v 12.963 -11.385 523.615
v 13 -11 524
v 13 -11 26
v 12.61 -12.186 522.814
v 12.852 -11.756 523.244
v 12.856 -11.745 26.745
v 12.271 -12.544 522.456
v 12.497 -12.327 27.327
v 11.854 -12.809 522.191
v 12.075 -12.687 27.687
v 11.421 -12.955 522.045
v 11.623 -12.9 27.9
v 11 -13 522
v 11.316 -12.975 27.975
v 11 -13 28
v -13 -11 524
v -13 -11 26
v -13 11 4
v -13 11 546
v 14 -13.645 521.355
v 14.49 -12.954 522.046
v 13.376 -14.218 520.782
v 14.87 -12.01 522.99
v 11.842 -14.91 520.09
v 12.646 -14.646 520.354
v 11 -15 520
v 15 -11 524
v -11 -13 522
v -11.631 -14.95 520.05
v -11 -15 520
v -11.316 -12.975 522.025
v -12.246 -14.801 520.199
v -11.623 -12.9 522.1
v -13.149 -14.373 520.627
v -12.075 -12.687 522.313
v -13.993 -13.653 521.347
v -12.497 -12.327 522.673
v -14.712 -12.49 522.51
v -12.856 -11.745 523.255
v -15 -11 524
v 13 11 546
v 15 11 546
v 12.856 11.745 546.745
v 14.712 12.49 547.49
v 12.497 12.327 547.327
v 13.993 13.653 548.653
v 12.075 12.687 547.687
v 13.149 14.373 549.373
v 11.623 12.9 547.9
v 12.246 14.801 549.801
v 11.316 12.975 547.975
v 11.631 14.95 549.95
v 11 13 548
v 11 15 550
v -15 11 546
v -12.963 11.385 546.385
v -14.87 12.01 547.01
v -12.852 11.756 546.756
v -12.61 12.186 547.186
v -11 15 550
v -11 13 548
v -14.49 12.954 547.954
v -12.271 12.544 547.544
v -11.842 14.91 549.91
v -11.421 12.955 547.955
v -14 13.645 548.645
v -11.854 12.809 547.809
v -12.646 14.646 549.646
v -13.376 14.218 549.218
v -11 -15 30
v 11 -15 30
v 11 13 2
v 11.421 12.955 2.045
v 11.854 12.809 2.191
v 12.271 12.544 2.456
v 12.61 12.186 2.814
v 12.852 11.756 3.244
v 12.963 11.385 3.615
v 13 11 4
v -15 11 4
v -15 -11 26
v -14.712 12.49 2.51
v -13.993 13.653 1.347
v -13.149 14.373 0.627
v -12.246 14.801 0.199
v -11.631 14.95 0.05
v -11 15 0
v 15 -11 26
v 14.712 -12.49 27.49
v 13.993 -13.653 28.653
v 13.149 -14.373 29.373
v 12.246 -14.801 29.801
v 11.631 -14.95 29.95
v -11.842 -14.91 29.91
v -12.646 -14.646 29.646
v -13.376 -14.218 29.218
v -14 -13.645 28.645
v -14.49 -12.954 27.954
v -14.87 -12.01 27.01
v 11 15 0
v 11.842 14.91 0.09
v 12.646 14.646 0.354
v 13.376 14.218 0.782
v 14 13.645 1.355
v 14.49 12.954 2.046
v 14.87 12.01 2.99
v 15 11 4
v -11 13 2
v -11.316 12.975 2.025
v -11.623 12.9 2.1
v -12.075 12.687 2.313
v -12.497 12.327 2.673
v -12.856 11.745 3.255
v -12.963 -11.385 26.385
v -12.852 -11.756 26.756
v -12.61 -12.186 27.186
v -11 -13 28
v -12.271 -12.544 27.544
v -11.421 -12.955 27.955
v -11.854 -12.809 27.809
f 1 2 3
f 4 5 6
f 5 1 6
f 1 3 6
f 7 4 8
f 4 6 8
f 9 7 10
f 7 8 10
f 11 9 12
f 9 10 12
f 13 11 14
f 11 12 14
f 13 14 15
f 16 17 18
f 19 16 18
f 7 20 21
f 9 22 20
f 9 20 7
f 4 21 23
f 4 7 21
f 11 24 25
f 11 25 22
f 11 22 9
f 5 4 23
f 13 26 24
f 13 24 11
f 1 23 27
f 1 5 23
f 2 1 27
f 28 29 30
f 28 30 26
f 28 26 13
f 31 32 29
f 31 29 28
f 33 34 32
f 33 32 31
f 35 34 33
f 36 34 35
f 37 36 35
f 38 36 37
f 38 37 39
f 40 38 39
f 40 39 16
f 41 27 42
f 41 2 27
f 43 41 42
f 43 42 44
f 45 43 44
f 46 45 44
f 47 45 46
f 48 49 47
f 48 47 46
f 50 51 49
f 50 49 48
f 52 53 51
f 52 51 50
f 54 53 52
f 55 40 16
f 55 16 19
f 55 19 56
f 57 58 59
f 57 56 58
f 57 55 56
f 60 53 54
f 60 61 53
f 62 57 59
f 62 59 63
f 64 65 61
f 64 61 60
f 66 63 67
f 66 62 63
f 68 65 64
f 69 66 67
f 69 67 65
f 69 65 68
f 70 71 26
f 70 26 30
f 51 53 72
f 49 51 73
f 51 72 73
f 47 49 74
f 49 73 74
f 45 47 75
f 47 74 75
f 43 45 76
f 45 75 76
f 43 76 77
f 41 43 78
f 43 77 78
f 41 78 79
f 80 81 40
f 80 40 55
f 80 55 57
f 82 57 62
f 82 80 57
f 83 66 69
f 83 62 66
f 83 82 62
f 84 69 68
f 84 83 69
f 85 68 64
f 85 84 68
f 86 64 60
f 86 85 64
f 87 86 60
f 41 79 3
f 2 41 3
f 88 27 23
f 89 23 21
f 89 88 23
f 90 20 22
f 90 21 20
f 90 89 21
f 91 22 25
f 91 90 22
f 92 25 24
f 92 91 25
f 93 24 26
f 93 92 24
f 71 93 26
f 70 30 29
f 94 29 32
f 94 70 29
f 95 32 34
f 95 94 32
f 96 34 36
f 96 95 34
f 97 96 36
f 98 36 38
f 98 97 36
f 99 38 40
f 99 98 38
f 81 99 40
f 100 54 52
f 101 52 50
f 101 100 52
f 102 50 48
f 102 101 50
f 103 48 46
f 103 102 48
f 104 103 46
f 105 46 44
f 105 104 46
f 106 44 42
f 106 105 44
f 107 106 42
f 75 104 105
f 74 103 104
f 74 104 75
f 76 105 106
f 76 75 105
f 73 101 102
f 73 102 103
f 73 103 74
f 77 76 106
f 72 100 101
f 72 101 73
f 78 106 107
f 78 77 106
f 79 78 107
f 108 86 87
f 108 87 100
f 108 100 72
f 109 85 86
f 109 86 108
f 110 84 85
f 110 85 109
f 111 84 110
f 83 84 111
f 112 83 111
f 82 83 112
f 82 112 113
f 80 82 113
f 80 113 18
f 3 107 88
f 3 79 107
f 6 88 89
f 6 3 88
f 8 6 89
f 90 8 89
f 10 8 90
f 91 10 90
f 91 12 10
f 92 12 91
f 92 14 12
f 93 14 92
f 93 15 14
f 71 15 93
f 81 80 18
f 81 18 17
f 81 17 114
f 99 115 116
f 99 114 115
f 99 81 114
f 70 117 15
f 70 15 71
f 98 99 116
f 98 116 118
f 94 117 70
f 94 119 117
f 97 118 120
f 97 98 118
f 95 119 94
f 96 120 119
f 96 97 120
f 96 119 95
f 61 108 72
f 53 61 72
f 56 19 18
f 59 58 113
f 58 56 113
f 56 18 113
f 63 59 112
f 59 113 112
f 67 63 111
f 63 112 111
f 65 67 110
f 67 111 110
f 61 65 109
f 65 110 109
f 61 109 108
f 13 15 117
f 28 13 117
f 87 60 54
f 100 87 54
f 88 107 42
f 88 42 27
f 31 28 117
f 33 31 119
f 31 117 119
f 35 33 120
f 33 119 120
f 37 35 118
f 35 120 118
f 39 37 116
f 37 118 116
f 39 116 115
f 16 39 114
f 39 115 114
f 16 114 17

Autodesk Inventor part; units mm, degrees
ref_plane "Plano inicial" through (0, 0, 0) normal (0, 0, 1) x (1, 0, 0)
ref_plane "Plano final" through (0, 0, 550) normal (0, 0, 1) x (1, 0, 0)
sketch "Esboço" plane through (0, 0, 0) normal (0, 0, 1) x (1, 0, 0)
  line L0 (-15, -11) -> (-15, 11)
  line L1 (-11, 15) -> (11, 15)
  line L2 (15, 11) -> (15, -11)
  line L3 (11, -15) -> (-11, -15)
  arc A0 (-15, -11) -> (-11, -15) centre (-11, -11) ccw
  arc A1 (15, 11) -> (11, 15) centre (11, 11) ccw
  arc A2 (-11, 15) -> (-15, 11) centre (-11, 11) ccw
  arc A3 (11, -15) -> (15, -11) centre (11, -11) ccw
  arc A4 (-11, 13) -> (-13, 11) centre (-11, 11) ccw
  line L4 (-11, 13) -> (11, 13)
  arc A5 (13, 11) -> (11, 13) centre (11, 11) ccw
  line L5 (13, 11) -> (13, -11)
  arc A6 (11, -13) -> (13, -11) centre (11, -11) ccw
  line L6 (11, -13) -> (-11, -13)
  arc A7 (-13, -11) -> (-11, -13) centre (-11, -11) ccw
  line L7 (-13, -11) -> (-13, 11)
  line L8 (0, 22.1598) -> (0, -22.1598) construction
  line L9 (-22.1598, 0) -> (22.1598, 0) construction
  dimension "d7" = 4
  dimension "d9" = 30
  dimension "d11" = 30
  dimension "d12" = 2
  dimension "d15" = 15
  dimension "d16" = 15
extrude "Corpo" add sketch "Esboço" along normal up to surface (550 mm away) from surface at 0
sketch "Sketch3" plane through (0, 0, 0) normal (0, 0, 1) x (1, 0, 0)
  line L0 (0, 0) -> (10, 0)
ref_plane "Work Plane3" through (0, 0, 0) normal (0, -1, 0) x (1, 0, 0)
sketch "Sketch4" plane through (0, 0, 0) normal (0, -1, 0) x (1, 0, 0)
  line L0 (-2, 0) -> (12, 0)
  line L1 (-2, 550) -> (12, 550)
  dimension "d18" = 550
ref_plane "Plano de trabalho6" through (-155, 0, 0) normal (0, 0, -1) x (-1, 0, 0)
split "Dividir3" plane through (-155, 0, 0) removes the side toward (0, 0, -1)
ref_plane "Plano de trabalho7" through (-15, 0, 550) normal (0, 0, 1) x (1, 0, 0)
split "Dividir4" plane through (-15, 0, 550) removes the side toward (0, 0, 1)
ref_plane "Plano de trabalho8" through (0, 15, 550) normal (0, -0.7071, 0.7071) x (1, 0, 0)
split "Dividir5" plane through (0, 15, 550) removes the side toward (0, -0.7071, 0.7071)
ref_plane "Plano de trabalho9" through (0, 15, 0) normal (0, -0.7071, -0.7071) x (1, 0, 0)
split "Dividir6" plane through (0, 15, 0) removes the side toward (0, -0.7071, -0.7071)
equation "\"d7\" = G_IR"
equation "\"d9\" = G_W"
equation "\"d11\" = G_H"
equation "\"d12\" = G_T"
equation "\"d15\" = 0.5 * d9"
equation "\"d16\" = 0.5 * d11"
equation "\"d3\" = G_L"
equation "\"G_W\" = 30"
equation "\"G_H\" = 30"
equation "\"G_T\" = 2"
equation "\"G_IR\" = 4"
equation "\"G_L\" = d18"
equation "\"G_OFFSET_START\" = 0"
equation "\"G_OFFSET_END\" = 0"
properties part number "ISO 10799-2 - 30x30x2 - 550" material "Aço, suave"
